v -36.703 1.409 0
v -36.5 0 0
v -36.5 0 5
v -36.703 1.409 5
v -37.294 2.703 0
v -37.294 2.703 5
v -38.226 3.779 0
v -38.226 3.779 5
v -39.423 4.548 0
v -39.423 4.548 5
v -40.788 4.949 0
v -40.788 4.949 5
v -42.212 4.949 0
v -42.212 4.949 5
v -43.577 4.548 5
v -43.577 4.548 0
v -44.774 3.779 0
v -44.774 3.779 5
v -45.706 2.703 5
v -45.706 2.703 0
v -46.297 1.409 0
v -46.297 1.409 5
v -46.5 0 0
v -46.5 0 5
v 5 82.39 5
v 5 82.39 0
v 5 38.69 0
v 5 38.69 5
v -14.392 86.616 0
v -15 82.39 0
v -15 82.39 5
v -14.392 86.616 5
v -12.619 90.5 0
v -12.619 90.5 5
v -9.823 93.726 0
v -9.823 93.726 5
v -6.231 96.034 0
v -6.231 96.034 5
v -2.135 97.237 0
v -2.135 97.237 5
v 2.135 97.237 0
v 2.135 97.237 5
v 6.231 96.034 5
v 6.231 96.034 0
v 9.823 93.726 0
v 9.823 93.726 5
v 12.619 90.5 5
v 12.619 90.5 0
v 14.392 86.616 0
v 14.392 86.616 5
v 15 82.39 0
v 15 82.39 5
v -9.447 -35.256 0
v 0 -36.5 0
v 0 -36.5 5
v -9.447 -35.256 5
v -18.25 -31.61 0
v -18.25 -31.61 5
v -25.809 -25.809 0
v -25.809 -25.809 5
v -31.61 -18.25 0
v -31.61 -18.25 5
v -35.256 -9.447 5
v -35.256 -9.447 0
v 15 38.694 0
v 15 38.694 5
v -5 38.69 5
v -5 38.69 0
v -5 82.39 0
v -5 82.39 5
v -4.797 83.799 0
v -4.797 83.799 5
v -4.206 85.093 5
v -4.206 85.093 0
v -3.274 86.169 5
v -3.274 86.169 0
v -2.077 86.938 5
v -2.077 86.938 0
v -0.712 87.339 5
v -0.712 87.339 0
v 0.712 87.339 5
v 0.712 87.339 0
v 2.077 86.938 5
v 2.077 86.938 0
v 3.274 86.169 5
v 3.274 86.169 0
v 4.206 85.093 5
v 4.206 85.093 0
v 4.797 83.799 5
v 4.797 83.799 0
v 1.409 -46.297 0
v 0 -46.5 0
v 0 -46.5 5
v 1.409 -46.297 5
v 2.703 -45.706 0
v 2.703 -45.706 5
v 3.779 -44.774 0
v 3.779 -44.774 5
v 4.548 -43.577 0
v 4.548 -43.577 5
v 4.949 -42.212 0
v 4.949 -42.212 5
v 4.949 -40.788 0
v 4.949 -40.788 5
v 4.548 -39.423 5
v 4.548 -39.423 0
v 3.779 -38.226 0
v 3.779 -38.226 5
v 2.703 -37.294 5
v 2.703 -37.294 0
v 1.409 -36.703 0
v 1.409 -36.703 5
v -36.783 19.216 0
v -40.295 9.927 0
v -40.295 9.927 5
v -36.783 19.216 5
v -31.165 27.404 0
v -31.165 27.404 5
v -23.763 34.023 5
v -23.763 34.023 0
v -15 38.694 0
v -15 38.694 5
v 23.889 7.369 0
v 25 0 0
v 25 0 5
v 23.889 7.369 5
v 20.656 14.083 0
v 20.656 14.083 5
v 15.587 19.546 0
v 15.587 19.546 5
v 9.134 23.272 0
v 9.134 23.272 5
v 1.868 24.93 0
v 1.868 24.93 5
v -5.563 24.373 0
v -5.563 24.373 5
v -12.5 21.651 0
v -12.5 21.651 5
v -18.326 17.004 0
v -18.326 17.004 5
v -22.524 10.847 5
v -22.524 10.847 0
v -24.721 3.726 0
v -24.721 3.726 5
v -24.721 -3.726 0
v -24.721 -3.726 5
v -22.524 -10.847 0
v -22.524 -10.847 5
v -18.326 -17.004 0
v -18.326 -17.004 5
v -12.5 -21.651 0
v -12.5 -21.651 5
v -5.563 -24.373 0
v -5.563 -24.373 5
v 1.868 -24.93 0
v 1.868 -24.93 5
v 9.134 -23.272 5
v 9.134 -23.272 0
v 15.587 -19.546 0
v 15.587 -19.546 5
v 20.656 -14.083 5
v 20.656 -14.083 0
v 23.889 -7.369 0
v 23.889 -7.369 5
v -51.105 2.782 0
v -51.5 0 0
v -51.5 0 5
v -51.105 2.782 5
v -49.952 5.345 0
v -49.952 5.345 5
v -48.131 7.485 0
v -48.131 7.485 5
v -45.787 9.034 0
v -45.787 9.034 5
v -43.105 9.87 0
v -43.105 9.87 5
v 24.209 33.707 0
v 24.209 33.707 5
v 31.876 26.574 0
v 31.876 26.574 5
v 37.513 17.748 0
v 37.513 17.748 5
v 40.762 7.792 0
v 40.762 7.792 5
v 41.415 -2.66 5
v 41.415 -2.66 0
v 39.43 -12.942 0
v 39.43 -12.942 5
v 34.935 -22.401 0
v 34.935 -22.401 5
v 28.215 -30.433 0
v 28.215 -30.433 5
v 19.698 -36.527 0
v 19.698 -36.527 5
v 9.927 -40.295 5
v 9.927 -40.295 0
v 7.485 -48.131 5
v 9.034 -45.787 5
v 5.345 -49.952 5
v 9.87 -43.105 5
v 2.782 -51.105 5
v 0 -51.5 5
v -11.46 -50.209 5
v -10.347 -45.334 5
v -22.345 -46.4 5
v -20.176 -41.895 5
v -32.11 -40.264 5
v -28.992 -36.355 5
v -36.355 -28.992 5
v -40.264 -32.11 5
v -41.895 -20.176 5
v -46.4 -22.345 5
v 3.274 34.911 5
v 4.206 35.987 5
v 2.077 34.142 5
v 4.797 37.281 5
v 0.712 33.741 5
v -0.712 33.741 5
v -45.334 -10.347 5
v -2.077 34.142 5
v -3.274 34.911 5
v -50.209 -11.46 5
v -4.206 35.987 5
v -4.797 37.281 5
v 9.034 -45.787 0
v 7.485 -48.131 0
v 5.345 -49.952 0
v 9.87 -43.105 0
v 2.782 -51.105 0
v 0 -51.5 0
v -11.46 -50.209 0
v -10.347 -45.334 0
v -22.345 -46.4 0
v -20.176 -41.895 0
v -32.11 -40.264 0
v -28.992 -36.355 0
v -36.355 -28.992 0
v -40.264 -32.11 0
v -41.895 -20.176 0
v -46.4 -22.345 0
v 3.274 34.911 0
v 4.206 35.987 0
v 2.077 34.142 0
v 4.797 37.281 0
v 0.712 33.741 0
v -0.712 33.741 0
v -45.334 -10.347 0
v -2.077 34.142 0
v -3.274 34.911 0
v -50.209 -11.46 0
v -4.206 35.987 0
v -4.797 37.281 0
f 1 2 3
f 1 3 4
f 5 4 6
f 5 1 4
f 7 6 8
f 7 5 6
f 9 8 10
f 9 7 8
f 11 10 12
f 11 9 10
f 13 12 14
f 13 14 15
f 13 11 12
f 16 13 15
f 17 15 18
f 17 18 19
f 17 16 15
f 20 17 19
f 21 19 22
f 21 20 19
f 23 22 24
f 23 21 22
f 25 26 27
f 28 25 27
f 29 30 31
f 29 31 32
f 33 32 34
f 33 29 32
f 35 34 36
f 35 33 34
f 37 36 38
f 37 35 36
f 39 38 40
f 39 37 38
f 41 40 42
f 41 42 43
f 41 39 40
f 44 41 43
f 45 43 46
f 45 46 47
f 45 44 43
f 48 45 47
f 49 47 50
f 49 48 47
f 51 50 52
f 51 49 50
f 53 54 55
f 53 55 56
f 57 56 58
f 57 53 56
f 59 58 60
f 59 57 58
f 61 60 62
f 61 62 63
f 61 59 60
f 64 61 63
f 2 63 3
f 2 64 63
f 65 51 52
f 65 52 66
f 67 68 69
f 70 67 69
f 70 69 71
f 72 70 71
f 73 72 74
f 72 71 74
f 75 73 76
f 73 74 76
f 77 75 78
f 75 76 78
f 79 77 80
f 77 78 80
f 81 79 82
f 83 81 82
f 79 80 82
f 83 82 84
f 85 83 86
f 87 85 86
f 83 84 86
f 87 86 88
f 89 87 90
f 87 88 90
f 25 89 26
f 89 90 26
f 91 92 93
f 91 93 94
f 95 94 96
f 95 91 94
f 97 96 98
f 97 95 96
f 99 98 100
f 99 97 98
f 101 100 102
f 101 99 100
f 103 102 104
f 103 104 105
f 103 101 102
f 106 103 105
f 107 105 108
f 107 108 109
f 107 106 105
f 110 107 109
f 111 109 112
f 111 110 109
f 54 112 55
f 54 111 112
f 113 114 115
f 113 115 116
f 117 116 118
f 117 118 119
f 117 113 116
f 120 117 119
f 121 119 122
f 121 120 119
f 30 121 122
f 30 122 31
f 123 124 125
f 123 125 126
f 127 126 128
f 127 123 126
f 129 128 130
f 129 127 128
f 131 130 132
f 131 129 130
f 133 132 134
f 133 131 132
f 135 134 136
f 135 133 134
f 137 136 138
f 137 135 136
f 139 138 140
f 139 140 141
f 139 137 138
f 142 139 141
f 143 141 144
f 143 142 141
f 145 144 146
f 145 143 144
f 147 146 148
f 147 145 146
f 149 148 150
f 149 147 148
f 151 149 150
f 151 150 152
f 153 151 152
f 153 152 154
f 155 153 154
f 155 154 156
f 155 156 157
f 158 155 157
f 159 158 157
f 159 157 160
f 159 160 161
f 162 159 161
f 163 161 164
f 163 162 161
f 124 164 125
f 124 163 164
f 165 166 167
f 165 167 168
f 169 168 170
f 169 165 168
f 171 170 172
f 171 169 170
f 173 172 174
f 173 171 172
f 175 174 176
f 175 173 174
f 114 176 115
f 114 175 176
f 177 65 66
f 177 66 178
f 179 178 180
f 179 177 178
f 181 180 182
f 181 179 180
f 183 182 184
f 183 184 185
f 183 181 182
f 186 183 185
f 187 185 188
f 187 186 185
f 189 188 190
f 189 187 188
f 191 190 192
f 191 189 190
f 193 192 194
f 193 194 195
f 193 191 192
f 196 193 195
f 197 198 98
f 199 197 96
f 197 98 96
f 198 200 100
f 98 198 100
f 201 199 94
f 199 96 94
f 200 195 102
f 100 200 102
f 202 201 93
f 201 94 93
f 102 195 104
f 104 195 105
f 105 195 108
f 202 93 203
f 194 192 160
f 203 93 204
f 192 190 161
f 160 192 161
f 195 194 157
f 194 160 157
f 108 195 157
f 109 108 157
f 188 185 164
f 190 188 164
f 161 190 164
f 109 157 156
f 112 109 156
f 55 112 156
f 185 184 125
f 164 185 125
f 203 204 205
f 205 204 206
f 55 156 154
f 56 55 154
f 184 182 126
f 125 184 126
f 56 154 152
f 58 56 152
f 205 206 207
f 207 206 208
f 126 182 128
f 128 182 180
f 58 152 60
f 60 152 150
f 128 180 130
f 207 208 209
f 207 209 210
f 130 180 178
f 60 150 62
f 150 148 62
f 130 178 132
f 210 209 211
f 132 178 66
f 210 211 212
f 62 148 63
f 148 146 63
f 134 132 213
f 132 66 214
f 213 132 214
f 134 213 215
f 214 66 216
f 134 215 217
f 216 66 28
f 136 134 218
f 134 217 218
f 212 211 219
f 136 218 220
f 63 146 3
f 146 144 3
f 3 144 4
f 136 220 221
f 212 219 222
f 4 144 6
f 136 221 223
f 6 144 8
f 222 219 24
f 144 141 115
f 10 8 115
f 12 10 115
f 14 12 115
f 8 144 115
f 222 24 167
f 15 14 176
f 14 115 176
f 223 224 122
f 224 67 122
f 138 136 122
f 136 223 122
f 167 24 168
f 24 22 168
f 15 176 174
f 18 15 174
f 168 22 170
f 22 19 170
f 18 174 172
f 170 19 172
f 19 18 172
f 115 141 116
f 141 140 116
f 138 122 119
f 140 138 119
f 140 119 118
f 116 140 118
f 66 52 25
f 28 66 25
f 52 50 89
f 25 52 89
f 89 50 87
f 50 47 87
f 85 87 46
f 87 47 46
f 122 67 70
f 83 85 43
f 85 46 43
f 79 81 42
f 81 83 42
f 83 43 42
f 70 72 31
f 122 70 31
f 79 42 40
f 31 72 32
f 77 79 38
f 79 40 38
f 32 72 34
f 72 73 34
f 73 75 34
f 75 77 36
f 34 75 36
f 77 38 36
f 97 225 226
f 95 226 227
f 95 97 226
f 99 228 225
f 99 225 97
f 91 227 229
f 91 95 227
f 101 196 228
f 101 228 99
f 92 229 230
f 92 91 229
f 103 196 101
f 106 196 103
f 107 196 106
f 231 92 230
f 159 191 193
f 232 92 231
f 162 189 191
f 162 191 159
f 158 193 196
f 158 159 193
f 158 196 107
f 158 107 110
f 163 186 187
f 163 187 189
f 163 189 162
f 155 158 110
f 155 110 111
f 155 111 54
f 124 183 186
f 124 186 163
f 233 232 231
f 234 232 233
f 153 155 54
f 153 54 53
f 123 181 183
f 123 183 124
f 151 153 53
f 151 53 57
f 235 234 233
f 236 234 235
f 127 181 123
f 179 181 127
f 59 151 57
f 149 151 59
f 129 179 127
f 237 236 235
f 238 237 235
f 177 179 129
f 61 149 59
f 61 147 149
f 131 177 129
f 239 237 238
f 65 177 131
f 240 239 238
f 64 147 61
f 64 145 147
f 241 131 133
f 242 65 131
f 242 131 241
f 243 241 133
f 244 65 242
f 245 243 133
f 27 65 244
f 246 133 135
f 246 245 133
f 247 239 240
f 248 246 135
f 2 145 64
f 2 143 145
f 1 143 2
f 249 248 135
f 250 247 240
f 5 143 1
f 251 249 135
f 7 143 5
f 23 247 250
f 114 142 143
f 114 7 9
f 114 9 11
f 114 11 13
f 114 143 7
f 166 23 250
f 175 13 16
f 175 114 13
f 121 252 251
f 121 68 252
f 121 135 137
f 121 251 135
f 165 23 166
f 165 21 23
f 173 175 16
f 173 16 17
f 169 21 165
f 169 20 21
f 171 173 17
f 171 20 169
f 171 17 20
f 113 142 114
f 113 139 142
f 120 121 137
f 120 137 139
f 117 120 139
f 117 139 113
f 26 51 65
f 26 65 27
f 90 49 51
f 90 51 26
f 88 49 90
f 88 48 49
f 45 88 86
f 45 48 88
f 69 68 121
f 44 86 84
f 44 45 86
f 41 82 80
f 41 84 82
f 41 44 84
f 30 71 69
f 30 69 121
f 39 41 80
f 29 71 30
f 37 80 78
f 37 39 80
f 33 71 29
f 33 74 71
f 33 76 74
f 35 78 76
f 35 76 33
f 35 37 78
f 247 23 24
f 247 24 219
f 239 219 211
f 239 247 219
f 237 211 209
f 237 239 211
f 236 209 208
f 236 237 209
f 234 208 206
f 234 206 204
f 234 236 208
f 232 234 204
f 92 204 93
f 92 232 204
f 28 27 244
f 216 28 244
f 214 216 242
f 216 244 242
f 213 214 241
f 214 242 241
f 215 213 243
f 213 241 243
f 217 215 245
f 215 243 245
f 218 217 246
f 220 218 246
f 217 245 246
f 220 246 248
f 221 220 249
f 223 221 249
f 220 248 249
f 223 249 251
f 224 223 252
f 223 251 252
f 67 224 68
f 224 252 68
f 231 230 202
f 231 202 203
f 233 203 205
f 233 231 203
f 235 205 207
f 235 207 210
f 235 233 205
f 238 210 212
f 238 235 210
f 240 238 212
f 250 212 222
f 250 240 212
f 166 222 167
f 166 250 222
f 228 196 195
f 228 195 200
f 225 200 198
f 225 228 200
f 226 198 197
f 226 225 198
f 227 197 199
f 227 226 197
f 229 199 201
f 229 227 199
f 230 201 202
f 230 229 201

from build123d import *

# Parameters (mm, degrees)
SKETCH2_R           = 25
BOSS_EXTRUDE1_DEPTH = 5


with BuildPart() as part:
    # Sketch2 → Boss-Extrude1 (new body)
    with BuildSketch(Plane.XY):
        with BuildLine():
            Line((15, 82.39), (15, 38.694314828))
            ThreePointArc((15, 38.694314828), (41.414681799, -2.659723947), (9.927155207, -40.295180723))
            ThreePointArc((9.927155207, -40.295180723), (7.484924608, -48.131432999), (0, -51.5))
            ThreePointArc((0, -51.5), (-36.415999231, -36.415999231), (-51.5, 0))
            ThreePointArc((-51.5, 0), (-48.131432999, 7.484924608), (-40.295180723, 9.927155207))
            ThreePointArc((-40.295180723, 9.927155207), (-31.16531118, 27.403893502), (-15, 38.694314828))
            Line((-15, 38.694314828), (-15, 82.39))
            ThreePointArc((-15, 82.39), (0, 97.39), (15, 82.39))
        make_face()
        Circle(SKETCH2_R, mode=Mode.SUBTRACT)
        with BuildLine():
            Line((-5, 38.69), (-5, 82.39))
            ThreePointArc((-5, 82.39), (0, 87.39), (5, 82.39))
            Line((5, 82.39), (5, 38.69))
            ThreePointArc((5, 38.69), (0, 33.69), (-5, 38.69))
        make_face(mode=Mode.SUBTRACT)
        with BuildLine():
            ThreePointArc((-46.5, 0), (-32.880465325, -32.880465325), (0, -46.5))
            ThreePointArc((0, -46.5), (5, -41.5), (0, -36.5))
            ThreePointArc((0, -36.5), (-25.809397513, -25.809397513), (-36.5, 0))
            ThreePointArc((-36.5, 0), (-41.5, 5), (-46.5, 0))
        make_face(mode=Mode.SUBTRACT)
    extrude(amount=BOSS_EXTRUDE1_DEPTH)


solid = part.part
